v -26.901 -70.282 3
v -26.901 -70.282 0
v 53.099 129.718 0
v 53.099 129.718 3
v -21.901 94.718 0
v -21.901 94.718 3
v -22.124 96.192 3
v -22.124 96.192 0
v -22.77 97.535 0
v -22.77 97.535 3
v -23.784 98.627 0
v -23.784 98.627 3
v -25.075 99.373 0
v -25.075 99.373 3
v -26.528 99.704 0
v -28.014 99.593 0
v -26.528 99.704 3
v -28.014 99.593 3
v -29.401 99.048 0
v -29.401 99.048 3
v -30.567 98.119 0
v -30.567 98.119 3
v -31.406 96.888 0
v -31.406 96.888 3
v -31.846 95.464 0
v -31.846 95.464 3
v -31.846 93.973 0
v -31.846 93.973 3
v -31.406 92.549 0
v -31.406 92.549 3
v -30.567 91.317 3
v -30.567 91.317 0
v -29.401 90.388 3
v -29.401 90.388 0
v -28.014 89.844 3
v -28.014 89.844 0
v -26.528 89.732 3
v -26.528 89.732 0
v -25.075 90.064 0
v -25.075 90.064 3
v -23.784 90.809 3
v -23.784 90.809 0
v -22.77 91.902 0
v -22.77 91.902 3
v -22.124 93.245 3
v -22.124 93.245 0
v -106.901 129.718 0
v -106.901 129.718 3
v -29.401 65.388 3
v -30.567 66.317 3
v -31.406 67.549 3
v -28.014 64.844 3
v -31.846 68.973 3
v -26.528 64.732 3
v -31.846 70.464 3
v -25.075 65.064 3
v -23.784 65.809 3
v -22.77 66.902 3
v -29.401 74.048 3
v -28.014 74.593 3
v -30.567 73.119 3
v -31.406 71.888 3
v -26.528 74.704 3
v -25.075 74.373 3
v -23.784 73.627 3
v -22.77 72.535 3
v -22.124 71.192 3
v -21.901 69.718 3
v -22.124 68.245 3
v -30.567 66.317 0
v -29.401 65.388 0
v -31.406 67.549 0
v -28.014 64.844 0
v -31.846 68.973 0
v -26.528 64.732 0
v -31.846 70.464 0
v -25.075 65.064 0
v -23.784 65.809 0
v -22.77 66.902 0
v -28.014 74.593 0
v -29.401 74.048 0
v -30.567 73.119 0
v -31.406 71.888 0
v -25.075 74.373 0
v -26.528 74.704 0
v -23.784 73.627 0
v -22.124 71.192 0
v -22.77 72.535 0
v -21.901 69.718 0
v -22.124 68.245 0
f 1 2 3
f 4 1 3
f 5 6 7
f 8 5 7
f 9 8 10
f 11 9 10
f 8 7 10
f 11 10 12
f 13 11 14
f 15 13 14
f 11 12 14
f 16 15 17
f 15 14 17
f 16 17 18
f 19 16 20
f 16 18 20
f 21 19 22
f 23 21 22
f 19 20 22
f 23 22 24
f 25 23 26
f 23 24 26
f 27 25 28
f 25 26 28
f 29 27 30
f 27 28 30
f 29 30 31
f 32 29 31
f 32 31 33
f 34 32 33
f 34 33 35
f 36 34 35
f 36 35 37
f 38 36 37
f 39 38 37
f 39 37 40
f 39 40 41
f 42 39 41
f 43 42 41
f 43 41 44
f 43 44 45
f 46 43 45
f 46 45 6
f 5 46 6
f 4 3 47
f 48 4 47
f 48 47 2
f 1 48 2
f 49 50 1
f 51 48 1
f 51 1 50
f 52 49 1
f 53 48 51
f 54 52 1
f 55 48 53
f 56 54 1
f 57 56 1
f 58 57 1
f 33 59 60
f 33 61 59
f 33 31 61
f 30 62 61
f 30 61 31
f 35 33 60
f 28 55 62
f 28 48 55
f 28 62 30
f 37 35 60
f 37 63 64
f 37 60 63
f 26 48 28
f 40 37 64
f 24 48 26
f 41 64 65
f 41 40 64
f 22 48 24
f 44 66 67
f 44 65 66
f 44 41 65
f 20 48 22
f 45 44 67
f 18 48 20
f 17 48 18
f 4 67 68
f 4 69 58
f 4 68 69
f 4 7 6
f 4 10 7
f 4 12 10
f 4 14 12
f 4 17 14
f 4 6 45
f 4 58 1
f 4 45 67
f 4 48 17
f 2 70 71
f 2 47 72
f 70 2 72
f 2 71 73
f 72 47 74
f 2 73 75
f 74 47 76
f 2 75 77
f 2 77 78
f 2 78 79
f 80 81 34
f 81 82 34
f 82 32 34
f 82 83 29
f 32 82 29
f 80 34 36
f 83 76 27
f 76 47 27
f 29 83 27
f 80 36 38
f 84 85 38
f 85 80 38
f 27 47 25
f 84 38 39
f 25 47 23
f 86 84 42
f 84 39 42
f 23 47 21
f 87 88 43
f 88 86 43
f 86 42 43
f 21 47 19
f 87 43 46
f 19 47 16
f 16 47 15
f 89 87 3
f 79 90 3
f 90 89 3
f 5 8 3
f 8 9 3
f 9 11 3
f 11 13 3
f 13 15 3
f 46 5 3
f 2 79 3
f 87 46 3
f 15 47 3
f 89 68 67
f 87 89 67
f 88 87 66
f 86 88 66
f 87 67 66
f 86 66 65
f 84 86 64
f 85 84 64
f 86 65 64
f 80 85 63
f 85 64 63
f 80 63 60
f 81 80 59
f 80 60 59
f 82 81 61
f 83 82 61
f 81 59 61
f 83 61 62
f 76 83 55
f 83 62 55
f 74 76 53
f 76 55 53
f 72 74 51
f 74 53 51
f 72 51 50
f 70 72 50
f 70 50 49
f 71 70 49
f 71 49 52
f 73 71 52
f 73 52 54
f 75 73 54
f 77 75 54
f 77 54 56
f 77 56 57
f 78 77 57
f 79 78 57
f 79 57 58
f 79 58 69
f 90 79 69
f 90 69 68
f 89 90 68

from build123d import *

# Parameters (mm, degrees)
BOSS_EXTRUDE1_DEPTH = 3
CUT_EXTRUDE1_REACH  = 5
SKETCH2_R           = 5


with BuildPart() as part:
    # Sketch1 → Boss-Extrude1 (new body)
    with BuildSketch(Plane.XY):
        Polygon((-26.901408451, -70.281690141), (53.098591549, 129.718309859), (-106.901408451, 129.718309859), align=None)
    extrude(amount=BOSS_EXTRUDE1_DEPTH)

    # Sketch2 → Cut-Extrude1 (cut, up to next)
    with BuildSketch(Plane.XY.offset(3), mode=Mode.PRIVATE) as cut_extrude1_sk1:
        with Locations((-26.901408451, 94.718309859)):
            Circle(SKETCH2_R)
    cut_extrude1_tool1 = extrude(cut_extrude1_sk1.sketch, amount=-CUT_EXTRUDE1_REACH, mode=Mode.PRIVATE) & part.part
    add(cut_extrude1_tool1.solids().sort_by_distance((-26.901408, 94.71831, 3))[0], mode=Mode.SUBTRACT)
    # Sketch2 → Cut-Extrude1 (cut, up to next)
    with BuildSketch(Plane.XY.offset(3), mode=Mode.PRIVATE) as cut_extrude1_sk2:
        with Locations((-26.901408451, 69.718309859)):
            Circle(SKETCH2_R)
    cut_extrude1_tool2 = extrude(cut_extrude1_sk2.sketch, amount=-CUT_EXTRUDE1_REACH, mode=Mode.PRIVATE) & part.part
    add(cut_extrude1_tool2.solids().sort_by_distance((-26.901408, 69.71831, 3))[0], mode=Mode.SUBTRACT)


solid = part.part
